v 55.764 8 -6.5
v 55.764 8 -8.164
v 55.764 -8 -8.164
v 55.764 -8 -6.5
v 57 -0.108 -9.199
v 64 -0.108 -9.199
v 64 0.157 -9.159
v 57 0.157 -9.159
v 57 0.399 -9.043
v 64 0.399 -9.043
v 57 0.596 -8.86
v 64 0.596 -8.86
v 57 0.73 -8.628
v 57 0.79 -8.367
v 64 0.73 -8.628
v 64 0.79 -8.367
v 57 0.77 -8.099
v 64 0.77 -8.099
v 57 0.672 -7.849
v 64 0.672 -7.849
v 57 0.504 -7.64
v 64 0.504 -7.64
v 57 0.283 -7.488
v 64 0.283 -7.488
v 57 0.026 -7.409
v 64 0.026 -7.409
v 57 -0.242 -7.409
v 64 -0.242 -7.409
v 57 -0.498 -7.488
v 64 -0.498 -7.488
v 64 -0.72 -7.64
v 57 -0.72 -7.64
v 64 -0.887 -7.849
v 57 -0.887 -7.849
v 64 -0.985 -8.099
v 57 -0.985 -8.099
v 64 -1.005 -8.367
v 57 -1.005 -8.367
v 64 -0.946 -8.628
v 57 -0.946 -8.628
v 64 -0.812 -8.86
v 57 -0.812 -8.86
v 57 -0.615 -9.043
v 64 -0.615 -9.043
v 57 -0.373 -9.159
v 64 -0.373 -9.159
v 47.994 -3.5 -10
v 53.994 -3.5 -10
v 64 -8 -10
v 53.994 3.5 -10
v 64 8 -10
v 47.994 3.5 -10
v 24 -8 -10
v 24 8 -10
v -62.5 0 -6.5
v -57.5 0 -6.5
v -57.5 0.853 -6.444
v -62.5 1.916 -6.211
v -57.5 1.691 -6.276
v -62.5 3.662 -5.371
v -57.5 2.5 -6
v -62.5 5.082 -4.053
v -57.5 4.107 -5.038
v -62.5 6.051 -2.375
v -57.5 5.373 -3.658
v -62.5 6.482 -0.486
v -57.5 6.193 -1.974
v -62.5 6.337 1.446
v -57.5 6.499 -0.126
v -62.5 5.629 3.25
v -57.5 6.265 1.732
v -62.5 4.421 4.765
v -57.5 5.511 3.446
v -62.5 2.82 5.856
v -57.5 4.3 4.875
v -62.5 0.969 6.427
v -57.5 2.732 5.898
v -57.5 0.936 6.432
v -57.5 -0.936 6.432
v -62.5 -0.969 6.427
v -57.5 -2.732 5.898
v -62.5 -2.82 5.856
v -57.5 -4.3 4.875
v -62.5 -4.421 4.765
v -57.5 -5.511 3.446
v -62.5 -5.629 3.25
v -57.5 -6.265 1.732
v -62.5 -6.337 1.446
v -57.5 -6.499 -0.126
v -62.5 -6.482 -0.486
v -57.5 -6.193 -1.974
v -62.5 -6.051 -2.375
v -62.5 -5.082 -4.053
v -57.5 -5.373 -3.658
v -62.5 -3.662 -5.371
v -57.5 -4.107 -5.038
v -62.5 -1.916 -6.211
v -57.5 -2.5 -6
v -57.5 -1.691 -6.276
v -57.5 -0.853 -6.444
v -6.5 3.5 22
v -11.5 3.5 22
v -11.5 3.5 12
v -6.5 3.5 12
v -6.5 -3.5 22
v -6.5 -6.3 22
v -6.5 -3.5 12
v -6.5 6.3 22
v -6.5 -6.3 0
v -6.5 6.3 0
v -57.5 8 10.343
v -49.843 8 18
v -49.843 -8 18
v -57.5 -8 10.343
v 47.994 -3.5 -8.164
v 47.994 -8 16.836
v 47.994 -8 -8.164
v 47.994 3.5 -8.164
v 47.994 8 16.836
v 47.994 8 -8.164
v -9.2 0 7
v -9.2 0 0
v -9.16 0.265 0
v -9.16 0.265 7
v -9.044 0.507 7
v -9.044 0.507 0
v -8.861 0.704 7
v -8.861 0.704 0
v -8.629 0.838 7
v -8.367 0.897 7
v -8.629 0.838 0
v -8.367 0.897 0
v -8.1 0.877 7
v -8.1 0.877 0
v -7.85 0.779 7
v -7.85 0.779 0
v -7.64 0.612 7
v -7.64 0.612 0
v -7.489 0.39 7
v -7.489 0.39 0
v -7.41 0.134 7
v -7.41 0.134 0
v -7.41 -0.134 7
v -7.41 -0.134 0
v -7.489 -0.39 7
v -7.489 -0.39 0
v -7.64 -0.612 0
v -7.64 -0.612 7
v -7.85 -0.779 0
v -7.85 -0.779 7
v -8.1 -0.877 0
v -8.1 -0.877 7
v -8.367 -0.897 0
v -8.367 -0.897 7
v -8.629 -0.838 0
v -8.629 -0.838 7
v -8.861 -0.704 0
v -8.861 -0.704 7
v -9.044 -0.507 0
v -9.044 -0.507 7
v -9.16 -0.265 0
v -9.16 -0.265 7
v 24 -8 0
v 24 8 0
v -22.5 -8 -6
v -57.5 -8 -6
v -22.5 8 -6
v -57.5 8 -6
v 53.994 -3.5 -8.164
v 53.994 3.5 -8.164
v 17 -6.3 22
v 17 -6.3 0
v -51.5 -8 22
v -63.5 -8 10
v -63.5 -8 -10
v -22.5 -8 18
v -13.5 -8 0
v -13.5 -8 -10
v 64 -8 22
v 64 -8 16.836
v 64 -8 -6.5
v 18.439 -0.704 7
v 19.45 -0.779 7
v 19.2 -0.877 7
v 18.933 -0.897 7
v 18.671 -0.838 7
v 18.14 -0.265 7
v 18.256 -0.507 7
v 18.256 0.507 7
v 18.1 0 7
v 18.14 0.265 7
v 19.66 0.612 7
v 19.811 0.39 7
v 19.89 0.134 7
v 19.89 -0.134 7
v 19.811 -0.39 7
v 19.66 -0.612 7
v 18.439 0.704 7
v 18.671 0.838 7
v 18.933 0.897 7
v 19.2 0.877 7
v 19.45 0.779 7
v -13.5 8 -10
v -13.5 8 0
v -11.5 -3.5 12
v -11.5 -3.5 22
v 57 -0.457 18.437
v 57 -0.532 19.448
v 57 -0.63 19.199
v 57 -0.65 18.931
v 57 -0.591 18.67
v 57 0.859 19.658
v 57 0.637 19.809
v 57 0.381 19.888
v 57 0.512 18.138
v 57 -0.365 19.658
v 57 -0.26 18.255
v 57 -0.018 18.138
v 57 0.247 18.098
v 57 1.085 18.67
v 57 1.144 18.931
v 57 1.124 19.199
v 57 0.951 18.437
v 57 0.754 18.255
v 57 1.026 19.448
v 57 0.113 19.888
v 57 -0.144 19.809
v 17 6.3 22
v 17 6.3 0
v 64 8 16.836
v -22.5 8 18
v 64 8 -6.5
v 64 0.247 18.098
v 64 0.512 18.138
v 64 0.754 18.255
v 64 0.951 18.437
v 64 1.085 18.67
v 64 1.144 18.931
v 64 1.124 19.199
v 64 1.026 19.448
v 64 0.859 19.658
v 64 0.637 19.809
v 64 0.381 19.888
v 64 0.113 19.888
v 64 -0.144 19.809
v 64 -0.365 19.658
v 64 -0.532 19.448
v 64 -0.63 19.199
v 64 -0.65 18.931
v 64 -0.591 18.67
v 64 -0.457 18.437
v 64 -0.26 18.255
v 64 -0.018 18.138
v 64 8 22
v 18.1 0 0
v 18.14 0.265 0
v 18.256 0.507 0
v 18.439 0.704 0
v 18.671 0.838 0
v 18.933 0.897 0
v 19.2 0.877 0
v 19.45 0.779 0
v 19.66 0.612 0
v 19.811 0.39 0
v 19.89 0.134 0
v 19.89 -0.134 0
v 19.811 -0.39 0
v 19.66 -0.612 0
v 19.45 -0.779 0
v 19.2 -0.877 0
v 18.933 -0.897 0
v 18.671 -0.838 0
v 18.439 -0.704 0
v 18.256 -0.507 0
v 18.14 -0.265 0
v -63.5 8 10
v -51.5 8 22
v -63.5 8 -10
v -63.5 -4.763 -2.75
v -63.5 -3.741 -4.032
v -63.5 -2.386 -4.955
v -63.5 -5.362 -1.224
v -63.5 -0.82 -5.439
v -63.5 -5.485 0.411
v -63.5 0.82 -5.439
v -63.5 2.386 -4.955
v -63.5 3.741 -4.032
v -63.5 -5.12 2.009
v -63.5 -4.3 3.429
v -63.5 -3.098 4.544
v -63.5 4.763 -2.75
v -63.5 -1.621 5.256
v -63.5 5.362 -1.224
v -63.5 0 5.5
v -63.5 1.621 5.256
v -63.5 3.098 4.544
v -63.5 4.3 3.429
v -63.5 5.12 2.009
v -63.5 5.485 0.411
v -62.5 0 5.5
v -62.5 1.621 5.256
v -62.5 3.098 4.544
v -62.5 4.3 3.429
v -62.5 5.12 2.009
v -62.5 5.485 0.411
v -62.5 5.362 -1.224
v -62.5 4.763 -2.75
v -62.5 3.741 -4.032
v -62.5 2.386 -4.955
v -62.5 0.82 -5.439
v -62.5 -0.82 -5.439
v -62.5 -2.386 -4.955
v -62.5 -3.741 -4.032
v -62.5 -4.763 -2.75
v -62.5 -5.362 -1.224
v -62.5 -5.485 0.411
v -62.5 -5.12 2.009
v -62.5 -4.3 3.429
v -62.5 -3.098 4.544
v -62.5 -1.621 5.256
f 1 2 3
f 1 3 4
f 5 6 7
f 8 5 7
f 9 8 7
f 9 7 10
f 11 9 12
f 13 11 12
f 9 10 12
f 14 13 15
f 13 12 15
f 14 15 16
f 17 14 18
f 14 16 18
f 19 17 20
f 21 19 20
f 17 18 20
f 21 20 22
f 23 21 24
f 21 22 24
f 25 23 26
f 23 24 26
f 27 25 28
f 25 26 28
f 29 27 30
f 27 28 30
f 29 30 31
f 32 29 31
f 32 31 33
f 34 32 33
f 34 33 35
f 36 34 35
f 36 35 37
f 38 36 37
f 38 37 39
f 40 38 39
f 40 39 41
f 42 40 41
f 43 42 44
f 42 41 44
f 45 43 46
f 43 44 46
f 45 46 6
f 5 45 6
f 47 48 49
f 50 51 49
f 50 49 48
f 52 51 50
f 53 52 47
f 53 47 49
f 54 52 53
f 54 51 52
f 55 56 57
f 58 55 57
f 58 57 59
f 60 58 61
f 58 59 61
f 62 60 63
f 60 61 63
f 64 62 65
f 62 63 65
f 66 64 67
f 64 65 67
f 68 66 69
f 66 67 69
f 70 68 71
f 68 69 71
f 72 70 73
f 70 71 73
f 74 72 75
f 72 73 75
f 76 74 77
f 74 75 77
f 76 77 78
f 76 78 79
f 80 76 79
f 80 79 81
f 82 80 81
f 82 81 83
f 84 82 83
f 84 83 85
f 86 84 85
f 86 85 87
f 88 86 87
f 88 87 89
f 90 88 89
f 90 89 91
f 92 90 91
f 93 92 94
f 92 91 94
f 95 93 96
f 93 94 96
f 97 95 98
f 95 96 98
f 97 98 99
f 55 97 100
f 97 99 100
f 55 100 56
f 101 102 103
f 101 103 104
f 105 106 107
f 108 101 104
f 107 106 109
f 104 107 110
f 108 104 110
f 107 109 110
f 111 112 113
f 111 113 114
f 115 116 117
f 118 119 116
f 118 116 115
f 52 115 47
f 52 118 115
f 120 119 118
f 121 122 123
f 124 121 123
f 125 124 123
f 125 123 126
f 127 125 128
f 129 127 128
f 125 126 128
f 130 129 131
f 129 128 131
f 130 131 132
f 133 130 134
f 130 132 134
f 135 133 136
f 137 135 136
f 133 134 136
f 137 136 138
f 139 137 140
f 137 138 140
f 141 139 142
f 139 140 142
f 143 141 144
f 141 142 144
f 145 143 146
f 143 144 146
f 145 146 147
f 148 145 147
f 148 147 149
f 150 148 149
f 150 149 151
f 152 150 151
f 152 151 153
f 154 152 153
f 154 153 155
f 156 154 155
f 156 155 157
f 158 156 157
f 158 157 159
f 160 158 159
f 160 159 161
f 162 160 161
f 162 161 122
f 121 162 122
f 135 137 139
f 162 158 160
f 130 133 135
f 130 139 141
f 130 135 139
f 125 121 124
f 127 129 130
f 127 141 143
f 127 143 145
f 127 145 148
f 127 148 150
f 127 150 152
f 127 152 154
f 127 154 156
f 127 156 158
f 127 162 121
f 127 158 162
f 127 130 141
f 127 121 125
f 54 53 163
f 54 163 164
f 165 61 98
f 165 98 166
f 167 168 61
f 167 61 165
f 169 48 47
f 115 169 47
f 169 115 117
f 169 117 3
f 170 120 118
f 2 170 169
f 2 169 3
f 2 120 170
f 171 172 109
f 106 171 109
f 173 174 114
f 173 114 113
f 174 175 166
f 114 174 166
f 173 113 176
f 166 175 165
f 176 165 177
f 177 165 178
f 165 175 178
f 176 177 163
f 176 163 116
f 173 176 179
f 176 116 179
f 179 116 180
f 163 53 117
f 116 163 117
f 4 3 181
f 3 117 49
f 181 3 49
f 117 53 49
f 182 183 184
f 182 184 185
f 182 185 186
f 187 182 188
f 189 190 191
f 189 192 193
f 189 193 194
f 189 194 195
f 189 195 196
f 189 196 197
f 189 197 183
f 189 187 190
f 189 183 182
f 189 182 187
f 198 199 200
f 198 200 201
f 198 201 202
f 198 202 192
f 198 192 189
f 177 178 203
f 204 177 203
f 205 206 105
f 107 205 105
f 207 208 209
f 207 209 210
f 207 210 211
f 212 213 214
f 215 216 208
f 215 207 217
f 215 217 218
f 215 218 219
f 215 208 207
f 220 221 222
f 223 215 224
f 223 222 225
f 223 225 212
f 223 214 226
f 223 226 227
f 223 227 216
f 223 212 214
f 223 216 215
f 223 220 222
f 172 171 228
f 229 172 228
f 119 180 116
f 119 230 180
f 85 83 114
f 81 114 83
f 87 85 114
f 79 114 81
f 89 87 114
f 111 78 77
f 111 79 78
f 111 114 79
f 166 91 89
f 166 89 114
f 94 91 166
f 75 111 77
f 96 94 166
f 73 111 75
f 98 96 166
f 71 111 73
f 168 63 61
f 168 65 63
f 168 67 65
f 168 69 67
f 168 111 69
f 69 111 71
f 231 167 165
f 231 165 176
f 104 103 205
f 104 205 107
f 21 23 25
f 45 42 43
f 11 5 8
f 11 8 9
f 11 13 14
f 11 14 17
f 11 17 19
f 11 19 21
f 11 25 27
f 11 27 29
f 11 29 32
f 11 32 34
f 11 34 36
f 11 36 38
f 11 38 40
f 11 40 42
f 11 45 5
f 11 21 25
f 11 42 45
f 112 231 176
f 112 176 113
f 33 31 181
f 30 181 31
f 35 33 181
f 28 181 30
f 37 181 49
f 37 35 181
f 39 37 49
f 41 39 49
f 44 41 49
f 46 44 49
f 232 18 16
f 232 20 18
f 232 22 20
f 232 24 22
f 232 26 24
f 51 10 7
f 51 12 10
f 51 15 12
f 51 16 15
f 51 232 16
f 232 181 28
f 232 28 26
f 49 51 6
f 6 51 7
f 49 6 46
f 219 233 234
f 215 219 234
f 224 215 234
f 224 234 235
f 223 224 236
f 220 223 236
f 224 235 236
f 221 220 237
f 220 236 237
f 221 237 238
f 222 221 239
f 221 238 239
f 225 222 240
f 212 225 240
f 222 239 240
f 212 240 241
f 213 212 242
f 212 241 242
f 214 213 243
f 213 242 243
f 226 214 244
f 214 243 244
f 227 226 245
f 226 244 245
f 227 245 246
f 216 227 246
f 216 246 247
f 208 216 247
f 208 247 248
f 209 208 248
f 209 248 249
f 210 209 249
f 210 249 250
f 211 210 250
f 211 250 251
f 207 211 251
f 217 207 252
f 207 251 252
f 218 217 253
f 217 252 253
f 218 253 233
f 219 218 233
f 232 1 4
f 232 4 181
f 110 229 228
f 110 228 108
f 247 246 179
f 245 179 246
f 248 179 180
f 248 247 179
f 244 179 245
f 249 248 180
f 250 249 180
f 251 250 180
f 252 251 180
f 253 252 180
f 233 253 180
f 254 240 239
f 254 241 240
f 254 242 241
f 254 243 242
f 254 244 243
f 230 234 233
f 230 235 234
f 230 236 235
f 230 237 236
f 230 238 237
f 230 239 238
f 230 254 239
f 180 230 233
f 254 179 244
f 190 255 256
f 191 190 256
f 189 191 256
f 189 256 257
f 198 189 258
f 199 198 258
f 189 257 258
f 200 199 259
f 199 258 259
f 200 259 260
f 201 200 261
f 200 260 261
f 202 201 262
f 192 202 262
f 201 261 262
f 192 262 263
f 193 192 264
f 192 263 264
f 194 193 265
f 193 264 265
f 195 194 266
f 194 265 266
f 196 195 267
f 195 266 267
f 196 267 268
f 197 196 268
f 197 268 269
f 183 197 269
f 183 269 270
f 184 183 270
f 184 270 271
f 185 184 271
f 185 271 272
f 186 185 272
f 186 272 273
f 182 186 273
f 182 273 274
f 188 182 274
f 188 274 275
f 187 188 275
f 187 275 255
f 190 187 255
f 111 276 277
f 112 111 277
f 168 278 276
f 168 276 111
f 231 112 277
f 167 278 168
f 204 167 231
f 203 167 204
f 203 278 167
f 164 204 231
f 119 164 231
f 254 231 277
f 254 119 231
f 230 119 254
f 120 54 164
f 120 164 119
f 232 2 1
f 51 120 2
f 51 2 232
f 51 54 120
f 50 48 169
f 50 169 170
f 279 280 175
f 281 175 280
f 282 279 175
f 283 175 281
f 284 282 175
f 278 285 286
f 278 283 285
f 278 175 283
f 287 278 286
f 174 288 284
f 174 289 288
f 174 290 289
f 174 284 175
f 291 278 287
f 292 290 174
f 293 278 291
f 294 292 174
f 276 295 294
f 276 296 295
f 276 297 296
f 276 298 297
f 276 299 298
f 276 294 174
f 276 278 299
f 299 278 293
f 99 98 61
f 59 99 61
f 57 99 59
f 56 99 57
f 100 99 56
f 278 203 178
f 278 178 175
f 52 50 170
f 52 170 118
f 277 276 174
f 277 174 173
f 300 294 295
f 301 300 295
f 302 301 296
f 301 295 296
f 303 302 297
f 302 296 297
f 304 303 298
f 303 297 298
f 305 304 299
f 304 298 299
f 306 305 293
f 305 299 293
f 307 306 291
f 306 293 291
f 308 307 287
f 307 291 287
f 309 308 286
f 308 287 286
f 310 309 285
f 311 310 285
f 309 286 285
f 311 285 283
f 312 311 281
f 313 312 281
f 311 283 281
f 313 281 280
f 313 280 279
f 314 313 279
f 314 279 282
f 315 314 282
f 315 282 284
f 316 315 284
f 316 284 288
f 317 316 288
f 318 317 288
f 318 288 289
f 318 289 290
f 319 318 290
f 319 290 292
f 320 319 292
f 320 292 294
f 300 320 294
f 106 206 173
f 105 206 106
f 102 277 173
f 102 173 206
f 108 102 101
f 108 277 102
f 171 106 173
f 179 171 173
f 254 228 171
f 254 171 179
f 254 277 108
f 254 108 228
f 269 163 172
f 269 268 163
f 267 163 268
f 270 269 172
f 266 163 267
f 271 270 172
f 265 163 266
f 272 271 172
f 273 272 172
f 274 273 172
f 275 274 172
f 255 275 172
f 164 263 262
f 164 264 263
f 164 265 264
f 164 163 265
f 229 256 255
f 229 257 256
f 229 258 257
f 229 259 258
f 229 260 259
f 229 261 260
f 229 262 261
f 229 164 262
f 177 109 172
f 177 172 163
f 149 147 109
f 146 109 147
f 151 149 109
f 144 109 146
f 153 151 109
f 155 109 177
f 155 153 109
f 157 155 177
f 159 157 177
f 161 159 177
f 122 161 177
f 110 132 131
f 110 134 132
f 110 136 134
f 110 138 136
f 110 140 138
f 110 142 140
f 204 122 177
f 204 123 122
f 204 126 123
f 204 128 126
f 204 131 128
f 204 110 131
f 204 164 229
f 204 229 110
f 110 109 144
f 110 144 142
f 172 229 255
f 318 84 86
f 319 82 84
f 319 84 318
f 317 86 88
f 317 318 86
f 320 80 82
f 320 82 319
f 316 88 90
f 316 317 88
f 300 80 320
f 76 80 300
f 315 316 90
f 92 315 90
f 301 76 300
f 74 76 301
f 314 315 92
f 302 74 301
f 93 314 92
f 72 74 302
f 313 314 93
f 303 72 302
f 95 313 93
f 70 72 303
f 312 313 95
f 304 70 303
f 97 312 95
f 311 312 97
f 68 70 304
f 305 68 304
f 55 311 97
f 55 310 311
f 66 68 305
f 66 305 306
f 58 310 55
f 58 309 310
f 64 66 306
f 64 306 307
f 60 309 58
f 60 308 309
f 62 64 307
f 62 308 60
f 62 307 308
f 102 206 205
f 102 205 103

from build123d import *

# Parameters (mm, degrees)
BOSS_EXTRUDE1_DEPTH      = 8
BOSS_EXTRUDE1_DEPTH_BACK = 8
SKETCH2_R                = 5.5
CUT_EXTRUDE1_DEPTH       = 8
CUT_EXTRUDE2_DEPTH       = 16
SKETCH4_R                = 6.5
CUT_EXTRUDE3_DEPTH       = 5
SKETCH5_W                = 23.5
SKETCH5_H                = 12.6
CUT_EXTRUDE4_DEPTH       = 33
SKETCH6_R                = 0.9
CUT_EXTRUDE5_DEPTH       = 17
SKETCH7_W                = 6
SKETCH7_H                = 7
CUT_EXTRUDE6_DEPTH       = 7
SKETCH8_W                = 5
SKETCH8_H                = 7
CUT_EXTRUDE7_DEPTH       = 10
SKETCH9_R                = 0.9
CUT_EXTRUDE8_DEPTH       = 7
SKETCH10_W               = 37.5
SKETCH10_H               = 16
CUT_EXTRUDE9_DEPTH       = 10


with BuildPart() as part:
    # Sketch1 → Boss-Extrude1 (new body, two sides)
    with BuildSketch(Plane(origin=(0, 0, 0), x_dir=(1, 0, 0), z_dir=(0, 1, 0))) as boss_extrude1_sk:
        Polygon((64, -16.835969506), (47.993540801, -16.835969506), (47.993540801, 8.164030494), (55.763890835, 8.164030494), (55.763890835, 6.5), (64, 6.5), (64, 10), (-63.5, 10), (-63.5, -10), (-51.5, -22), (64, -22), align=None)
    extrude(amount=BOSS_EXTRUDE1_DEPTH)
    extrude(boss_extrude1_sk.sketch, amount=-BOSS_EXTRUDE1_DEPTH_BACK)

    # Sketch2 → Cut-Extrude1 (cut)
    with BuildSketch(Plane.ZY.offset(63.5)):
        Circle(SKETCH2_R)
    extrude(amount=-CUT_EXTRUDE1_DEPTH, mode=Mode.SUBTRACT)

    # Sketch3 → Cut-Extrude2 (cut)
    with BuildSketch(Plane(origin=(0, 8, 0), x_dir=(1, 0, 0), z_dir=(0, 1, 0))):
        Polygon((-57.5, 6), (-22.5, 6), (-22.5, -18), (-49.843145751, -18), (-57.5, -10.343145751), align=None)
    extrude(amount=-CUT_EXTRUDE2_DEPTH, mode=Mode.SUBTRACT)

    # Sketch4 → Cut-Extrude3 (cut)
    with BuildSketch(Plane(origin=(-57.5, 0, 0), x_dir=(0, 0, -1), z_dir=(1, 0, 0))):
        Circle(SKETCH4_R)
    extrude(amount=-CUT_EXTRUDE3_DEPTH, mode=Mode.SUBTRACT)

    # Sketch5 → Cut-Extrude4 (cut, through all)
    with BuildSketch(Plane(origin=(0, 0, -10), x_dir=(-1, 0, 0), z_dir=(0, 0, -1))):
        with Locations((-5.25, 0)):
            Rectangle(SKETCH5_W, SKETCH5_H)
    extrude(amount=-CUT_EXTRUDE4_DEPTH, mode=Mode.SUBTRACT)

    # Sketch6 → Cut-Extrude5 (cut)
    with BuildSketch(Plane(origin=(0, 0, -10), x_dir=(-1, 0, 0), z_dir=(0, 0, -1))):
        with Locations((8.3, 0)):
            Circle(SKETCH6_R)
        with Locations((-19, 0)):
            Circle(SKETCH6_R)
    extrude(amount=-CUT_EXTRUDE5_DEPTH, mode=Mode.SUBTRACT)

    # Sketch7 → Cut-Extrude6 (cut)
    with BuildSketch(Plane(origin=(0, 0, -10), x_dir=(-1, 0, 0), z_dir=(0, 0, -1))):
        with Locations((-50.993540801, 0)):
            Rectangle(SKETCH7_W, SKETCH7_H)
    extrude(amount=-CUT_EXTRUDE6_DEPTH, mode=Mode.SUBTRACT)

    # Sketch8 → Cut-Extrude7 (cut)
    with BuildSketch(Plane.XY.offset(22)):
        with Locations((-9, 0)):
            Rectangle(SKETCH8_W, SKETCH8_H)
    extrude(amount=-CUT_EXTRUDE7_DEPTH, mode=Mode.SUBTRACT)

    # Sketch9 → Cut-Extrude8 (cut)
    with BuildSketch(Plane(origin=(64, 0, 0), x_dir=(0, 0, -1), z_dir=(1, 0, 0))):
        with Locations((-18.998394534, 0.246992196)):
            Circle(SKETCH9_R)
        with Locations((8.299298665, -0.107896591)):
            Circle(SKETCH9_R)
    extrude(amount=-CUT_EXTRUDE8_DEPTH, mode=Mode.SUBTRACT)

    # Sketch10 → Cut-Extrude9 (cut)
    with BuildSketch(Plane(origin=(0, 0, -10), x_dir=(-1, 0, 0), z_dir=(0, 0, -1))):
        with Locations((-5.25, 0)):
            Rectangle(SKETCH10_W, SKETCH10_H)
    extrude(amount=-CUT_EXTRUDE9_DEPTH, mode=Mode.SUBTRACT)


solid = part.part
